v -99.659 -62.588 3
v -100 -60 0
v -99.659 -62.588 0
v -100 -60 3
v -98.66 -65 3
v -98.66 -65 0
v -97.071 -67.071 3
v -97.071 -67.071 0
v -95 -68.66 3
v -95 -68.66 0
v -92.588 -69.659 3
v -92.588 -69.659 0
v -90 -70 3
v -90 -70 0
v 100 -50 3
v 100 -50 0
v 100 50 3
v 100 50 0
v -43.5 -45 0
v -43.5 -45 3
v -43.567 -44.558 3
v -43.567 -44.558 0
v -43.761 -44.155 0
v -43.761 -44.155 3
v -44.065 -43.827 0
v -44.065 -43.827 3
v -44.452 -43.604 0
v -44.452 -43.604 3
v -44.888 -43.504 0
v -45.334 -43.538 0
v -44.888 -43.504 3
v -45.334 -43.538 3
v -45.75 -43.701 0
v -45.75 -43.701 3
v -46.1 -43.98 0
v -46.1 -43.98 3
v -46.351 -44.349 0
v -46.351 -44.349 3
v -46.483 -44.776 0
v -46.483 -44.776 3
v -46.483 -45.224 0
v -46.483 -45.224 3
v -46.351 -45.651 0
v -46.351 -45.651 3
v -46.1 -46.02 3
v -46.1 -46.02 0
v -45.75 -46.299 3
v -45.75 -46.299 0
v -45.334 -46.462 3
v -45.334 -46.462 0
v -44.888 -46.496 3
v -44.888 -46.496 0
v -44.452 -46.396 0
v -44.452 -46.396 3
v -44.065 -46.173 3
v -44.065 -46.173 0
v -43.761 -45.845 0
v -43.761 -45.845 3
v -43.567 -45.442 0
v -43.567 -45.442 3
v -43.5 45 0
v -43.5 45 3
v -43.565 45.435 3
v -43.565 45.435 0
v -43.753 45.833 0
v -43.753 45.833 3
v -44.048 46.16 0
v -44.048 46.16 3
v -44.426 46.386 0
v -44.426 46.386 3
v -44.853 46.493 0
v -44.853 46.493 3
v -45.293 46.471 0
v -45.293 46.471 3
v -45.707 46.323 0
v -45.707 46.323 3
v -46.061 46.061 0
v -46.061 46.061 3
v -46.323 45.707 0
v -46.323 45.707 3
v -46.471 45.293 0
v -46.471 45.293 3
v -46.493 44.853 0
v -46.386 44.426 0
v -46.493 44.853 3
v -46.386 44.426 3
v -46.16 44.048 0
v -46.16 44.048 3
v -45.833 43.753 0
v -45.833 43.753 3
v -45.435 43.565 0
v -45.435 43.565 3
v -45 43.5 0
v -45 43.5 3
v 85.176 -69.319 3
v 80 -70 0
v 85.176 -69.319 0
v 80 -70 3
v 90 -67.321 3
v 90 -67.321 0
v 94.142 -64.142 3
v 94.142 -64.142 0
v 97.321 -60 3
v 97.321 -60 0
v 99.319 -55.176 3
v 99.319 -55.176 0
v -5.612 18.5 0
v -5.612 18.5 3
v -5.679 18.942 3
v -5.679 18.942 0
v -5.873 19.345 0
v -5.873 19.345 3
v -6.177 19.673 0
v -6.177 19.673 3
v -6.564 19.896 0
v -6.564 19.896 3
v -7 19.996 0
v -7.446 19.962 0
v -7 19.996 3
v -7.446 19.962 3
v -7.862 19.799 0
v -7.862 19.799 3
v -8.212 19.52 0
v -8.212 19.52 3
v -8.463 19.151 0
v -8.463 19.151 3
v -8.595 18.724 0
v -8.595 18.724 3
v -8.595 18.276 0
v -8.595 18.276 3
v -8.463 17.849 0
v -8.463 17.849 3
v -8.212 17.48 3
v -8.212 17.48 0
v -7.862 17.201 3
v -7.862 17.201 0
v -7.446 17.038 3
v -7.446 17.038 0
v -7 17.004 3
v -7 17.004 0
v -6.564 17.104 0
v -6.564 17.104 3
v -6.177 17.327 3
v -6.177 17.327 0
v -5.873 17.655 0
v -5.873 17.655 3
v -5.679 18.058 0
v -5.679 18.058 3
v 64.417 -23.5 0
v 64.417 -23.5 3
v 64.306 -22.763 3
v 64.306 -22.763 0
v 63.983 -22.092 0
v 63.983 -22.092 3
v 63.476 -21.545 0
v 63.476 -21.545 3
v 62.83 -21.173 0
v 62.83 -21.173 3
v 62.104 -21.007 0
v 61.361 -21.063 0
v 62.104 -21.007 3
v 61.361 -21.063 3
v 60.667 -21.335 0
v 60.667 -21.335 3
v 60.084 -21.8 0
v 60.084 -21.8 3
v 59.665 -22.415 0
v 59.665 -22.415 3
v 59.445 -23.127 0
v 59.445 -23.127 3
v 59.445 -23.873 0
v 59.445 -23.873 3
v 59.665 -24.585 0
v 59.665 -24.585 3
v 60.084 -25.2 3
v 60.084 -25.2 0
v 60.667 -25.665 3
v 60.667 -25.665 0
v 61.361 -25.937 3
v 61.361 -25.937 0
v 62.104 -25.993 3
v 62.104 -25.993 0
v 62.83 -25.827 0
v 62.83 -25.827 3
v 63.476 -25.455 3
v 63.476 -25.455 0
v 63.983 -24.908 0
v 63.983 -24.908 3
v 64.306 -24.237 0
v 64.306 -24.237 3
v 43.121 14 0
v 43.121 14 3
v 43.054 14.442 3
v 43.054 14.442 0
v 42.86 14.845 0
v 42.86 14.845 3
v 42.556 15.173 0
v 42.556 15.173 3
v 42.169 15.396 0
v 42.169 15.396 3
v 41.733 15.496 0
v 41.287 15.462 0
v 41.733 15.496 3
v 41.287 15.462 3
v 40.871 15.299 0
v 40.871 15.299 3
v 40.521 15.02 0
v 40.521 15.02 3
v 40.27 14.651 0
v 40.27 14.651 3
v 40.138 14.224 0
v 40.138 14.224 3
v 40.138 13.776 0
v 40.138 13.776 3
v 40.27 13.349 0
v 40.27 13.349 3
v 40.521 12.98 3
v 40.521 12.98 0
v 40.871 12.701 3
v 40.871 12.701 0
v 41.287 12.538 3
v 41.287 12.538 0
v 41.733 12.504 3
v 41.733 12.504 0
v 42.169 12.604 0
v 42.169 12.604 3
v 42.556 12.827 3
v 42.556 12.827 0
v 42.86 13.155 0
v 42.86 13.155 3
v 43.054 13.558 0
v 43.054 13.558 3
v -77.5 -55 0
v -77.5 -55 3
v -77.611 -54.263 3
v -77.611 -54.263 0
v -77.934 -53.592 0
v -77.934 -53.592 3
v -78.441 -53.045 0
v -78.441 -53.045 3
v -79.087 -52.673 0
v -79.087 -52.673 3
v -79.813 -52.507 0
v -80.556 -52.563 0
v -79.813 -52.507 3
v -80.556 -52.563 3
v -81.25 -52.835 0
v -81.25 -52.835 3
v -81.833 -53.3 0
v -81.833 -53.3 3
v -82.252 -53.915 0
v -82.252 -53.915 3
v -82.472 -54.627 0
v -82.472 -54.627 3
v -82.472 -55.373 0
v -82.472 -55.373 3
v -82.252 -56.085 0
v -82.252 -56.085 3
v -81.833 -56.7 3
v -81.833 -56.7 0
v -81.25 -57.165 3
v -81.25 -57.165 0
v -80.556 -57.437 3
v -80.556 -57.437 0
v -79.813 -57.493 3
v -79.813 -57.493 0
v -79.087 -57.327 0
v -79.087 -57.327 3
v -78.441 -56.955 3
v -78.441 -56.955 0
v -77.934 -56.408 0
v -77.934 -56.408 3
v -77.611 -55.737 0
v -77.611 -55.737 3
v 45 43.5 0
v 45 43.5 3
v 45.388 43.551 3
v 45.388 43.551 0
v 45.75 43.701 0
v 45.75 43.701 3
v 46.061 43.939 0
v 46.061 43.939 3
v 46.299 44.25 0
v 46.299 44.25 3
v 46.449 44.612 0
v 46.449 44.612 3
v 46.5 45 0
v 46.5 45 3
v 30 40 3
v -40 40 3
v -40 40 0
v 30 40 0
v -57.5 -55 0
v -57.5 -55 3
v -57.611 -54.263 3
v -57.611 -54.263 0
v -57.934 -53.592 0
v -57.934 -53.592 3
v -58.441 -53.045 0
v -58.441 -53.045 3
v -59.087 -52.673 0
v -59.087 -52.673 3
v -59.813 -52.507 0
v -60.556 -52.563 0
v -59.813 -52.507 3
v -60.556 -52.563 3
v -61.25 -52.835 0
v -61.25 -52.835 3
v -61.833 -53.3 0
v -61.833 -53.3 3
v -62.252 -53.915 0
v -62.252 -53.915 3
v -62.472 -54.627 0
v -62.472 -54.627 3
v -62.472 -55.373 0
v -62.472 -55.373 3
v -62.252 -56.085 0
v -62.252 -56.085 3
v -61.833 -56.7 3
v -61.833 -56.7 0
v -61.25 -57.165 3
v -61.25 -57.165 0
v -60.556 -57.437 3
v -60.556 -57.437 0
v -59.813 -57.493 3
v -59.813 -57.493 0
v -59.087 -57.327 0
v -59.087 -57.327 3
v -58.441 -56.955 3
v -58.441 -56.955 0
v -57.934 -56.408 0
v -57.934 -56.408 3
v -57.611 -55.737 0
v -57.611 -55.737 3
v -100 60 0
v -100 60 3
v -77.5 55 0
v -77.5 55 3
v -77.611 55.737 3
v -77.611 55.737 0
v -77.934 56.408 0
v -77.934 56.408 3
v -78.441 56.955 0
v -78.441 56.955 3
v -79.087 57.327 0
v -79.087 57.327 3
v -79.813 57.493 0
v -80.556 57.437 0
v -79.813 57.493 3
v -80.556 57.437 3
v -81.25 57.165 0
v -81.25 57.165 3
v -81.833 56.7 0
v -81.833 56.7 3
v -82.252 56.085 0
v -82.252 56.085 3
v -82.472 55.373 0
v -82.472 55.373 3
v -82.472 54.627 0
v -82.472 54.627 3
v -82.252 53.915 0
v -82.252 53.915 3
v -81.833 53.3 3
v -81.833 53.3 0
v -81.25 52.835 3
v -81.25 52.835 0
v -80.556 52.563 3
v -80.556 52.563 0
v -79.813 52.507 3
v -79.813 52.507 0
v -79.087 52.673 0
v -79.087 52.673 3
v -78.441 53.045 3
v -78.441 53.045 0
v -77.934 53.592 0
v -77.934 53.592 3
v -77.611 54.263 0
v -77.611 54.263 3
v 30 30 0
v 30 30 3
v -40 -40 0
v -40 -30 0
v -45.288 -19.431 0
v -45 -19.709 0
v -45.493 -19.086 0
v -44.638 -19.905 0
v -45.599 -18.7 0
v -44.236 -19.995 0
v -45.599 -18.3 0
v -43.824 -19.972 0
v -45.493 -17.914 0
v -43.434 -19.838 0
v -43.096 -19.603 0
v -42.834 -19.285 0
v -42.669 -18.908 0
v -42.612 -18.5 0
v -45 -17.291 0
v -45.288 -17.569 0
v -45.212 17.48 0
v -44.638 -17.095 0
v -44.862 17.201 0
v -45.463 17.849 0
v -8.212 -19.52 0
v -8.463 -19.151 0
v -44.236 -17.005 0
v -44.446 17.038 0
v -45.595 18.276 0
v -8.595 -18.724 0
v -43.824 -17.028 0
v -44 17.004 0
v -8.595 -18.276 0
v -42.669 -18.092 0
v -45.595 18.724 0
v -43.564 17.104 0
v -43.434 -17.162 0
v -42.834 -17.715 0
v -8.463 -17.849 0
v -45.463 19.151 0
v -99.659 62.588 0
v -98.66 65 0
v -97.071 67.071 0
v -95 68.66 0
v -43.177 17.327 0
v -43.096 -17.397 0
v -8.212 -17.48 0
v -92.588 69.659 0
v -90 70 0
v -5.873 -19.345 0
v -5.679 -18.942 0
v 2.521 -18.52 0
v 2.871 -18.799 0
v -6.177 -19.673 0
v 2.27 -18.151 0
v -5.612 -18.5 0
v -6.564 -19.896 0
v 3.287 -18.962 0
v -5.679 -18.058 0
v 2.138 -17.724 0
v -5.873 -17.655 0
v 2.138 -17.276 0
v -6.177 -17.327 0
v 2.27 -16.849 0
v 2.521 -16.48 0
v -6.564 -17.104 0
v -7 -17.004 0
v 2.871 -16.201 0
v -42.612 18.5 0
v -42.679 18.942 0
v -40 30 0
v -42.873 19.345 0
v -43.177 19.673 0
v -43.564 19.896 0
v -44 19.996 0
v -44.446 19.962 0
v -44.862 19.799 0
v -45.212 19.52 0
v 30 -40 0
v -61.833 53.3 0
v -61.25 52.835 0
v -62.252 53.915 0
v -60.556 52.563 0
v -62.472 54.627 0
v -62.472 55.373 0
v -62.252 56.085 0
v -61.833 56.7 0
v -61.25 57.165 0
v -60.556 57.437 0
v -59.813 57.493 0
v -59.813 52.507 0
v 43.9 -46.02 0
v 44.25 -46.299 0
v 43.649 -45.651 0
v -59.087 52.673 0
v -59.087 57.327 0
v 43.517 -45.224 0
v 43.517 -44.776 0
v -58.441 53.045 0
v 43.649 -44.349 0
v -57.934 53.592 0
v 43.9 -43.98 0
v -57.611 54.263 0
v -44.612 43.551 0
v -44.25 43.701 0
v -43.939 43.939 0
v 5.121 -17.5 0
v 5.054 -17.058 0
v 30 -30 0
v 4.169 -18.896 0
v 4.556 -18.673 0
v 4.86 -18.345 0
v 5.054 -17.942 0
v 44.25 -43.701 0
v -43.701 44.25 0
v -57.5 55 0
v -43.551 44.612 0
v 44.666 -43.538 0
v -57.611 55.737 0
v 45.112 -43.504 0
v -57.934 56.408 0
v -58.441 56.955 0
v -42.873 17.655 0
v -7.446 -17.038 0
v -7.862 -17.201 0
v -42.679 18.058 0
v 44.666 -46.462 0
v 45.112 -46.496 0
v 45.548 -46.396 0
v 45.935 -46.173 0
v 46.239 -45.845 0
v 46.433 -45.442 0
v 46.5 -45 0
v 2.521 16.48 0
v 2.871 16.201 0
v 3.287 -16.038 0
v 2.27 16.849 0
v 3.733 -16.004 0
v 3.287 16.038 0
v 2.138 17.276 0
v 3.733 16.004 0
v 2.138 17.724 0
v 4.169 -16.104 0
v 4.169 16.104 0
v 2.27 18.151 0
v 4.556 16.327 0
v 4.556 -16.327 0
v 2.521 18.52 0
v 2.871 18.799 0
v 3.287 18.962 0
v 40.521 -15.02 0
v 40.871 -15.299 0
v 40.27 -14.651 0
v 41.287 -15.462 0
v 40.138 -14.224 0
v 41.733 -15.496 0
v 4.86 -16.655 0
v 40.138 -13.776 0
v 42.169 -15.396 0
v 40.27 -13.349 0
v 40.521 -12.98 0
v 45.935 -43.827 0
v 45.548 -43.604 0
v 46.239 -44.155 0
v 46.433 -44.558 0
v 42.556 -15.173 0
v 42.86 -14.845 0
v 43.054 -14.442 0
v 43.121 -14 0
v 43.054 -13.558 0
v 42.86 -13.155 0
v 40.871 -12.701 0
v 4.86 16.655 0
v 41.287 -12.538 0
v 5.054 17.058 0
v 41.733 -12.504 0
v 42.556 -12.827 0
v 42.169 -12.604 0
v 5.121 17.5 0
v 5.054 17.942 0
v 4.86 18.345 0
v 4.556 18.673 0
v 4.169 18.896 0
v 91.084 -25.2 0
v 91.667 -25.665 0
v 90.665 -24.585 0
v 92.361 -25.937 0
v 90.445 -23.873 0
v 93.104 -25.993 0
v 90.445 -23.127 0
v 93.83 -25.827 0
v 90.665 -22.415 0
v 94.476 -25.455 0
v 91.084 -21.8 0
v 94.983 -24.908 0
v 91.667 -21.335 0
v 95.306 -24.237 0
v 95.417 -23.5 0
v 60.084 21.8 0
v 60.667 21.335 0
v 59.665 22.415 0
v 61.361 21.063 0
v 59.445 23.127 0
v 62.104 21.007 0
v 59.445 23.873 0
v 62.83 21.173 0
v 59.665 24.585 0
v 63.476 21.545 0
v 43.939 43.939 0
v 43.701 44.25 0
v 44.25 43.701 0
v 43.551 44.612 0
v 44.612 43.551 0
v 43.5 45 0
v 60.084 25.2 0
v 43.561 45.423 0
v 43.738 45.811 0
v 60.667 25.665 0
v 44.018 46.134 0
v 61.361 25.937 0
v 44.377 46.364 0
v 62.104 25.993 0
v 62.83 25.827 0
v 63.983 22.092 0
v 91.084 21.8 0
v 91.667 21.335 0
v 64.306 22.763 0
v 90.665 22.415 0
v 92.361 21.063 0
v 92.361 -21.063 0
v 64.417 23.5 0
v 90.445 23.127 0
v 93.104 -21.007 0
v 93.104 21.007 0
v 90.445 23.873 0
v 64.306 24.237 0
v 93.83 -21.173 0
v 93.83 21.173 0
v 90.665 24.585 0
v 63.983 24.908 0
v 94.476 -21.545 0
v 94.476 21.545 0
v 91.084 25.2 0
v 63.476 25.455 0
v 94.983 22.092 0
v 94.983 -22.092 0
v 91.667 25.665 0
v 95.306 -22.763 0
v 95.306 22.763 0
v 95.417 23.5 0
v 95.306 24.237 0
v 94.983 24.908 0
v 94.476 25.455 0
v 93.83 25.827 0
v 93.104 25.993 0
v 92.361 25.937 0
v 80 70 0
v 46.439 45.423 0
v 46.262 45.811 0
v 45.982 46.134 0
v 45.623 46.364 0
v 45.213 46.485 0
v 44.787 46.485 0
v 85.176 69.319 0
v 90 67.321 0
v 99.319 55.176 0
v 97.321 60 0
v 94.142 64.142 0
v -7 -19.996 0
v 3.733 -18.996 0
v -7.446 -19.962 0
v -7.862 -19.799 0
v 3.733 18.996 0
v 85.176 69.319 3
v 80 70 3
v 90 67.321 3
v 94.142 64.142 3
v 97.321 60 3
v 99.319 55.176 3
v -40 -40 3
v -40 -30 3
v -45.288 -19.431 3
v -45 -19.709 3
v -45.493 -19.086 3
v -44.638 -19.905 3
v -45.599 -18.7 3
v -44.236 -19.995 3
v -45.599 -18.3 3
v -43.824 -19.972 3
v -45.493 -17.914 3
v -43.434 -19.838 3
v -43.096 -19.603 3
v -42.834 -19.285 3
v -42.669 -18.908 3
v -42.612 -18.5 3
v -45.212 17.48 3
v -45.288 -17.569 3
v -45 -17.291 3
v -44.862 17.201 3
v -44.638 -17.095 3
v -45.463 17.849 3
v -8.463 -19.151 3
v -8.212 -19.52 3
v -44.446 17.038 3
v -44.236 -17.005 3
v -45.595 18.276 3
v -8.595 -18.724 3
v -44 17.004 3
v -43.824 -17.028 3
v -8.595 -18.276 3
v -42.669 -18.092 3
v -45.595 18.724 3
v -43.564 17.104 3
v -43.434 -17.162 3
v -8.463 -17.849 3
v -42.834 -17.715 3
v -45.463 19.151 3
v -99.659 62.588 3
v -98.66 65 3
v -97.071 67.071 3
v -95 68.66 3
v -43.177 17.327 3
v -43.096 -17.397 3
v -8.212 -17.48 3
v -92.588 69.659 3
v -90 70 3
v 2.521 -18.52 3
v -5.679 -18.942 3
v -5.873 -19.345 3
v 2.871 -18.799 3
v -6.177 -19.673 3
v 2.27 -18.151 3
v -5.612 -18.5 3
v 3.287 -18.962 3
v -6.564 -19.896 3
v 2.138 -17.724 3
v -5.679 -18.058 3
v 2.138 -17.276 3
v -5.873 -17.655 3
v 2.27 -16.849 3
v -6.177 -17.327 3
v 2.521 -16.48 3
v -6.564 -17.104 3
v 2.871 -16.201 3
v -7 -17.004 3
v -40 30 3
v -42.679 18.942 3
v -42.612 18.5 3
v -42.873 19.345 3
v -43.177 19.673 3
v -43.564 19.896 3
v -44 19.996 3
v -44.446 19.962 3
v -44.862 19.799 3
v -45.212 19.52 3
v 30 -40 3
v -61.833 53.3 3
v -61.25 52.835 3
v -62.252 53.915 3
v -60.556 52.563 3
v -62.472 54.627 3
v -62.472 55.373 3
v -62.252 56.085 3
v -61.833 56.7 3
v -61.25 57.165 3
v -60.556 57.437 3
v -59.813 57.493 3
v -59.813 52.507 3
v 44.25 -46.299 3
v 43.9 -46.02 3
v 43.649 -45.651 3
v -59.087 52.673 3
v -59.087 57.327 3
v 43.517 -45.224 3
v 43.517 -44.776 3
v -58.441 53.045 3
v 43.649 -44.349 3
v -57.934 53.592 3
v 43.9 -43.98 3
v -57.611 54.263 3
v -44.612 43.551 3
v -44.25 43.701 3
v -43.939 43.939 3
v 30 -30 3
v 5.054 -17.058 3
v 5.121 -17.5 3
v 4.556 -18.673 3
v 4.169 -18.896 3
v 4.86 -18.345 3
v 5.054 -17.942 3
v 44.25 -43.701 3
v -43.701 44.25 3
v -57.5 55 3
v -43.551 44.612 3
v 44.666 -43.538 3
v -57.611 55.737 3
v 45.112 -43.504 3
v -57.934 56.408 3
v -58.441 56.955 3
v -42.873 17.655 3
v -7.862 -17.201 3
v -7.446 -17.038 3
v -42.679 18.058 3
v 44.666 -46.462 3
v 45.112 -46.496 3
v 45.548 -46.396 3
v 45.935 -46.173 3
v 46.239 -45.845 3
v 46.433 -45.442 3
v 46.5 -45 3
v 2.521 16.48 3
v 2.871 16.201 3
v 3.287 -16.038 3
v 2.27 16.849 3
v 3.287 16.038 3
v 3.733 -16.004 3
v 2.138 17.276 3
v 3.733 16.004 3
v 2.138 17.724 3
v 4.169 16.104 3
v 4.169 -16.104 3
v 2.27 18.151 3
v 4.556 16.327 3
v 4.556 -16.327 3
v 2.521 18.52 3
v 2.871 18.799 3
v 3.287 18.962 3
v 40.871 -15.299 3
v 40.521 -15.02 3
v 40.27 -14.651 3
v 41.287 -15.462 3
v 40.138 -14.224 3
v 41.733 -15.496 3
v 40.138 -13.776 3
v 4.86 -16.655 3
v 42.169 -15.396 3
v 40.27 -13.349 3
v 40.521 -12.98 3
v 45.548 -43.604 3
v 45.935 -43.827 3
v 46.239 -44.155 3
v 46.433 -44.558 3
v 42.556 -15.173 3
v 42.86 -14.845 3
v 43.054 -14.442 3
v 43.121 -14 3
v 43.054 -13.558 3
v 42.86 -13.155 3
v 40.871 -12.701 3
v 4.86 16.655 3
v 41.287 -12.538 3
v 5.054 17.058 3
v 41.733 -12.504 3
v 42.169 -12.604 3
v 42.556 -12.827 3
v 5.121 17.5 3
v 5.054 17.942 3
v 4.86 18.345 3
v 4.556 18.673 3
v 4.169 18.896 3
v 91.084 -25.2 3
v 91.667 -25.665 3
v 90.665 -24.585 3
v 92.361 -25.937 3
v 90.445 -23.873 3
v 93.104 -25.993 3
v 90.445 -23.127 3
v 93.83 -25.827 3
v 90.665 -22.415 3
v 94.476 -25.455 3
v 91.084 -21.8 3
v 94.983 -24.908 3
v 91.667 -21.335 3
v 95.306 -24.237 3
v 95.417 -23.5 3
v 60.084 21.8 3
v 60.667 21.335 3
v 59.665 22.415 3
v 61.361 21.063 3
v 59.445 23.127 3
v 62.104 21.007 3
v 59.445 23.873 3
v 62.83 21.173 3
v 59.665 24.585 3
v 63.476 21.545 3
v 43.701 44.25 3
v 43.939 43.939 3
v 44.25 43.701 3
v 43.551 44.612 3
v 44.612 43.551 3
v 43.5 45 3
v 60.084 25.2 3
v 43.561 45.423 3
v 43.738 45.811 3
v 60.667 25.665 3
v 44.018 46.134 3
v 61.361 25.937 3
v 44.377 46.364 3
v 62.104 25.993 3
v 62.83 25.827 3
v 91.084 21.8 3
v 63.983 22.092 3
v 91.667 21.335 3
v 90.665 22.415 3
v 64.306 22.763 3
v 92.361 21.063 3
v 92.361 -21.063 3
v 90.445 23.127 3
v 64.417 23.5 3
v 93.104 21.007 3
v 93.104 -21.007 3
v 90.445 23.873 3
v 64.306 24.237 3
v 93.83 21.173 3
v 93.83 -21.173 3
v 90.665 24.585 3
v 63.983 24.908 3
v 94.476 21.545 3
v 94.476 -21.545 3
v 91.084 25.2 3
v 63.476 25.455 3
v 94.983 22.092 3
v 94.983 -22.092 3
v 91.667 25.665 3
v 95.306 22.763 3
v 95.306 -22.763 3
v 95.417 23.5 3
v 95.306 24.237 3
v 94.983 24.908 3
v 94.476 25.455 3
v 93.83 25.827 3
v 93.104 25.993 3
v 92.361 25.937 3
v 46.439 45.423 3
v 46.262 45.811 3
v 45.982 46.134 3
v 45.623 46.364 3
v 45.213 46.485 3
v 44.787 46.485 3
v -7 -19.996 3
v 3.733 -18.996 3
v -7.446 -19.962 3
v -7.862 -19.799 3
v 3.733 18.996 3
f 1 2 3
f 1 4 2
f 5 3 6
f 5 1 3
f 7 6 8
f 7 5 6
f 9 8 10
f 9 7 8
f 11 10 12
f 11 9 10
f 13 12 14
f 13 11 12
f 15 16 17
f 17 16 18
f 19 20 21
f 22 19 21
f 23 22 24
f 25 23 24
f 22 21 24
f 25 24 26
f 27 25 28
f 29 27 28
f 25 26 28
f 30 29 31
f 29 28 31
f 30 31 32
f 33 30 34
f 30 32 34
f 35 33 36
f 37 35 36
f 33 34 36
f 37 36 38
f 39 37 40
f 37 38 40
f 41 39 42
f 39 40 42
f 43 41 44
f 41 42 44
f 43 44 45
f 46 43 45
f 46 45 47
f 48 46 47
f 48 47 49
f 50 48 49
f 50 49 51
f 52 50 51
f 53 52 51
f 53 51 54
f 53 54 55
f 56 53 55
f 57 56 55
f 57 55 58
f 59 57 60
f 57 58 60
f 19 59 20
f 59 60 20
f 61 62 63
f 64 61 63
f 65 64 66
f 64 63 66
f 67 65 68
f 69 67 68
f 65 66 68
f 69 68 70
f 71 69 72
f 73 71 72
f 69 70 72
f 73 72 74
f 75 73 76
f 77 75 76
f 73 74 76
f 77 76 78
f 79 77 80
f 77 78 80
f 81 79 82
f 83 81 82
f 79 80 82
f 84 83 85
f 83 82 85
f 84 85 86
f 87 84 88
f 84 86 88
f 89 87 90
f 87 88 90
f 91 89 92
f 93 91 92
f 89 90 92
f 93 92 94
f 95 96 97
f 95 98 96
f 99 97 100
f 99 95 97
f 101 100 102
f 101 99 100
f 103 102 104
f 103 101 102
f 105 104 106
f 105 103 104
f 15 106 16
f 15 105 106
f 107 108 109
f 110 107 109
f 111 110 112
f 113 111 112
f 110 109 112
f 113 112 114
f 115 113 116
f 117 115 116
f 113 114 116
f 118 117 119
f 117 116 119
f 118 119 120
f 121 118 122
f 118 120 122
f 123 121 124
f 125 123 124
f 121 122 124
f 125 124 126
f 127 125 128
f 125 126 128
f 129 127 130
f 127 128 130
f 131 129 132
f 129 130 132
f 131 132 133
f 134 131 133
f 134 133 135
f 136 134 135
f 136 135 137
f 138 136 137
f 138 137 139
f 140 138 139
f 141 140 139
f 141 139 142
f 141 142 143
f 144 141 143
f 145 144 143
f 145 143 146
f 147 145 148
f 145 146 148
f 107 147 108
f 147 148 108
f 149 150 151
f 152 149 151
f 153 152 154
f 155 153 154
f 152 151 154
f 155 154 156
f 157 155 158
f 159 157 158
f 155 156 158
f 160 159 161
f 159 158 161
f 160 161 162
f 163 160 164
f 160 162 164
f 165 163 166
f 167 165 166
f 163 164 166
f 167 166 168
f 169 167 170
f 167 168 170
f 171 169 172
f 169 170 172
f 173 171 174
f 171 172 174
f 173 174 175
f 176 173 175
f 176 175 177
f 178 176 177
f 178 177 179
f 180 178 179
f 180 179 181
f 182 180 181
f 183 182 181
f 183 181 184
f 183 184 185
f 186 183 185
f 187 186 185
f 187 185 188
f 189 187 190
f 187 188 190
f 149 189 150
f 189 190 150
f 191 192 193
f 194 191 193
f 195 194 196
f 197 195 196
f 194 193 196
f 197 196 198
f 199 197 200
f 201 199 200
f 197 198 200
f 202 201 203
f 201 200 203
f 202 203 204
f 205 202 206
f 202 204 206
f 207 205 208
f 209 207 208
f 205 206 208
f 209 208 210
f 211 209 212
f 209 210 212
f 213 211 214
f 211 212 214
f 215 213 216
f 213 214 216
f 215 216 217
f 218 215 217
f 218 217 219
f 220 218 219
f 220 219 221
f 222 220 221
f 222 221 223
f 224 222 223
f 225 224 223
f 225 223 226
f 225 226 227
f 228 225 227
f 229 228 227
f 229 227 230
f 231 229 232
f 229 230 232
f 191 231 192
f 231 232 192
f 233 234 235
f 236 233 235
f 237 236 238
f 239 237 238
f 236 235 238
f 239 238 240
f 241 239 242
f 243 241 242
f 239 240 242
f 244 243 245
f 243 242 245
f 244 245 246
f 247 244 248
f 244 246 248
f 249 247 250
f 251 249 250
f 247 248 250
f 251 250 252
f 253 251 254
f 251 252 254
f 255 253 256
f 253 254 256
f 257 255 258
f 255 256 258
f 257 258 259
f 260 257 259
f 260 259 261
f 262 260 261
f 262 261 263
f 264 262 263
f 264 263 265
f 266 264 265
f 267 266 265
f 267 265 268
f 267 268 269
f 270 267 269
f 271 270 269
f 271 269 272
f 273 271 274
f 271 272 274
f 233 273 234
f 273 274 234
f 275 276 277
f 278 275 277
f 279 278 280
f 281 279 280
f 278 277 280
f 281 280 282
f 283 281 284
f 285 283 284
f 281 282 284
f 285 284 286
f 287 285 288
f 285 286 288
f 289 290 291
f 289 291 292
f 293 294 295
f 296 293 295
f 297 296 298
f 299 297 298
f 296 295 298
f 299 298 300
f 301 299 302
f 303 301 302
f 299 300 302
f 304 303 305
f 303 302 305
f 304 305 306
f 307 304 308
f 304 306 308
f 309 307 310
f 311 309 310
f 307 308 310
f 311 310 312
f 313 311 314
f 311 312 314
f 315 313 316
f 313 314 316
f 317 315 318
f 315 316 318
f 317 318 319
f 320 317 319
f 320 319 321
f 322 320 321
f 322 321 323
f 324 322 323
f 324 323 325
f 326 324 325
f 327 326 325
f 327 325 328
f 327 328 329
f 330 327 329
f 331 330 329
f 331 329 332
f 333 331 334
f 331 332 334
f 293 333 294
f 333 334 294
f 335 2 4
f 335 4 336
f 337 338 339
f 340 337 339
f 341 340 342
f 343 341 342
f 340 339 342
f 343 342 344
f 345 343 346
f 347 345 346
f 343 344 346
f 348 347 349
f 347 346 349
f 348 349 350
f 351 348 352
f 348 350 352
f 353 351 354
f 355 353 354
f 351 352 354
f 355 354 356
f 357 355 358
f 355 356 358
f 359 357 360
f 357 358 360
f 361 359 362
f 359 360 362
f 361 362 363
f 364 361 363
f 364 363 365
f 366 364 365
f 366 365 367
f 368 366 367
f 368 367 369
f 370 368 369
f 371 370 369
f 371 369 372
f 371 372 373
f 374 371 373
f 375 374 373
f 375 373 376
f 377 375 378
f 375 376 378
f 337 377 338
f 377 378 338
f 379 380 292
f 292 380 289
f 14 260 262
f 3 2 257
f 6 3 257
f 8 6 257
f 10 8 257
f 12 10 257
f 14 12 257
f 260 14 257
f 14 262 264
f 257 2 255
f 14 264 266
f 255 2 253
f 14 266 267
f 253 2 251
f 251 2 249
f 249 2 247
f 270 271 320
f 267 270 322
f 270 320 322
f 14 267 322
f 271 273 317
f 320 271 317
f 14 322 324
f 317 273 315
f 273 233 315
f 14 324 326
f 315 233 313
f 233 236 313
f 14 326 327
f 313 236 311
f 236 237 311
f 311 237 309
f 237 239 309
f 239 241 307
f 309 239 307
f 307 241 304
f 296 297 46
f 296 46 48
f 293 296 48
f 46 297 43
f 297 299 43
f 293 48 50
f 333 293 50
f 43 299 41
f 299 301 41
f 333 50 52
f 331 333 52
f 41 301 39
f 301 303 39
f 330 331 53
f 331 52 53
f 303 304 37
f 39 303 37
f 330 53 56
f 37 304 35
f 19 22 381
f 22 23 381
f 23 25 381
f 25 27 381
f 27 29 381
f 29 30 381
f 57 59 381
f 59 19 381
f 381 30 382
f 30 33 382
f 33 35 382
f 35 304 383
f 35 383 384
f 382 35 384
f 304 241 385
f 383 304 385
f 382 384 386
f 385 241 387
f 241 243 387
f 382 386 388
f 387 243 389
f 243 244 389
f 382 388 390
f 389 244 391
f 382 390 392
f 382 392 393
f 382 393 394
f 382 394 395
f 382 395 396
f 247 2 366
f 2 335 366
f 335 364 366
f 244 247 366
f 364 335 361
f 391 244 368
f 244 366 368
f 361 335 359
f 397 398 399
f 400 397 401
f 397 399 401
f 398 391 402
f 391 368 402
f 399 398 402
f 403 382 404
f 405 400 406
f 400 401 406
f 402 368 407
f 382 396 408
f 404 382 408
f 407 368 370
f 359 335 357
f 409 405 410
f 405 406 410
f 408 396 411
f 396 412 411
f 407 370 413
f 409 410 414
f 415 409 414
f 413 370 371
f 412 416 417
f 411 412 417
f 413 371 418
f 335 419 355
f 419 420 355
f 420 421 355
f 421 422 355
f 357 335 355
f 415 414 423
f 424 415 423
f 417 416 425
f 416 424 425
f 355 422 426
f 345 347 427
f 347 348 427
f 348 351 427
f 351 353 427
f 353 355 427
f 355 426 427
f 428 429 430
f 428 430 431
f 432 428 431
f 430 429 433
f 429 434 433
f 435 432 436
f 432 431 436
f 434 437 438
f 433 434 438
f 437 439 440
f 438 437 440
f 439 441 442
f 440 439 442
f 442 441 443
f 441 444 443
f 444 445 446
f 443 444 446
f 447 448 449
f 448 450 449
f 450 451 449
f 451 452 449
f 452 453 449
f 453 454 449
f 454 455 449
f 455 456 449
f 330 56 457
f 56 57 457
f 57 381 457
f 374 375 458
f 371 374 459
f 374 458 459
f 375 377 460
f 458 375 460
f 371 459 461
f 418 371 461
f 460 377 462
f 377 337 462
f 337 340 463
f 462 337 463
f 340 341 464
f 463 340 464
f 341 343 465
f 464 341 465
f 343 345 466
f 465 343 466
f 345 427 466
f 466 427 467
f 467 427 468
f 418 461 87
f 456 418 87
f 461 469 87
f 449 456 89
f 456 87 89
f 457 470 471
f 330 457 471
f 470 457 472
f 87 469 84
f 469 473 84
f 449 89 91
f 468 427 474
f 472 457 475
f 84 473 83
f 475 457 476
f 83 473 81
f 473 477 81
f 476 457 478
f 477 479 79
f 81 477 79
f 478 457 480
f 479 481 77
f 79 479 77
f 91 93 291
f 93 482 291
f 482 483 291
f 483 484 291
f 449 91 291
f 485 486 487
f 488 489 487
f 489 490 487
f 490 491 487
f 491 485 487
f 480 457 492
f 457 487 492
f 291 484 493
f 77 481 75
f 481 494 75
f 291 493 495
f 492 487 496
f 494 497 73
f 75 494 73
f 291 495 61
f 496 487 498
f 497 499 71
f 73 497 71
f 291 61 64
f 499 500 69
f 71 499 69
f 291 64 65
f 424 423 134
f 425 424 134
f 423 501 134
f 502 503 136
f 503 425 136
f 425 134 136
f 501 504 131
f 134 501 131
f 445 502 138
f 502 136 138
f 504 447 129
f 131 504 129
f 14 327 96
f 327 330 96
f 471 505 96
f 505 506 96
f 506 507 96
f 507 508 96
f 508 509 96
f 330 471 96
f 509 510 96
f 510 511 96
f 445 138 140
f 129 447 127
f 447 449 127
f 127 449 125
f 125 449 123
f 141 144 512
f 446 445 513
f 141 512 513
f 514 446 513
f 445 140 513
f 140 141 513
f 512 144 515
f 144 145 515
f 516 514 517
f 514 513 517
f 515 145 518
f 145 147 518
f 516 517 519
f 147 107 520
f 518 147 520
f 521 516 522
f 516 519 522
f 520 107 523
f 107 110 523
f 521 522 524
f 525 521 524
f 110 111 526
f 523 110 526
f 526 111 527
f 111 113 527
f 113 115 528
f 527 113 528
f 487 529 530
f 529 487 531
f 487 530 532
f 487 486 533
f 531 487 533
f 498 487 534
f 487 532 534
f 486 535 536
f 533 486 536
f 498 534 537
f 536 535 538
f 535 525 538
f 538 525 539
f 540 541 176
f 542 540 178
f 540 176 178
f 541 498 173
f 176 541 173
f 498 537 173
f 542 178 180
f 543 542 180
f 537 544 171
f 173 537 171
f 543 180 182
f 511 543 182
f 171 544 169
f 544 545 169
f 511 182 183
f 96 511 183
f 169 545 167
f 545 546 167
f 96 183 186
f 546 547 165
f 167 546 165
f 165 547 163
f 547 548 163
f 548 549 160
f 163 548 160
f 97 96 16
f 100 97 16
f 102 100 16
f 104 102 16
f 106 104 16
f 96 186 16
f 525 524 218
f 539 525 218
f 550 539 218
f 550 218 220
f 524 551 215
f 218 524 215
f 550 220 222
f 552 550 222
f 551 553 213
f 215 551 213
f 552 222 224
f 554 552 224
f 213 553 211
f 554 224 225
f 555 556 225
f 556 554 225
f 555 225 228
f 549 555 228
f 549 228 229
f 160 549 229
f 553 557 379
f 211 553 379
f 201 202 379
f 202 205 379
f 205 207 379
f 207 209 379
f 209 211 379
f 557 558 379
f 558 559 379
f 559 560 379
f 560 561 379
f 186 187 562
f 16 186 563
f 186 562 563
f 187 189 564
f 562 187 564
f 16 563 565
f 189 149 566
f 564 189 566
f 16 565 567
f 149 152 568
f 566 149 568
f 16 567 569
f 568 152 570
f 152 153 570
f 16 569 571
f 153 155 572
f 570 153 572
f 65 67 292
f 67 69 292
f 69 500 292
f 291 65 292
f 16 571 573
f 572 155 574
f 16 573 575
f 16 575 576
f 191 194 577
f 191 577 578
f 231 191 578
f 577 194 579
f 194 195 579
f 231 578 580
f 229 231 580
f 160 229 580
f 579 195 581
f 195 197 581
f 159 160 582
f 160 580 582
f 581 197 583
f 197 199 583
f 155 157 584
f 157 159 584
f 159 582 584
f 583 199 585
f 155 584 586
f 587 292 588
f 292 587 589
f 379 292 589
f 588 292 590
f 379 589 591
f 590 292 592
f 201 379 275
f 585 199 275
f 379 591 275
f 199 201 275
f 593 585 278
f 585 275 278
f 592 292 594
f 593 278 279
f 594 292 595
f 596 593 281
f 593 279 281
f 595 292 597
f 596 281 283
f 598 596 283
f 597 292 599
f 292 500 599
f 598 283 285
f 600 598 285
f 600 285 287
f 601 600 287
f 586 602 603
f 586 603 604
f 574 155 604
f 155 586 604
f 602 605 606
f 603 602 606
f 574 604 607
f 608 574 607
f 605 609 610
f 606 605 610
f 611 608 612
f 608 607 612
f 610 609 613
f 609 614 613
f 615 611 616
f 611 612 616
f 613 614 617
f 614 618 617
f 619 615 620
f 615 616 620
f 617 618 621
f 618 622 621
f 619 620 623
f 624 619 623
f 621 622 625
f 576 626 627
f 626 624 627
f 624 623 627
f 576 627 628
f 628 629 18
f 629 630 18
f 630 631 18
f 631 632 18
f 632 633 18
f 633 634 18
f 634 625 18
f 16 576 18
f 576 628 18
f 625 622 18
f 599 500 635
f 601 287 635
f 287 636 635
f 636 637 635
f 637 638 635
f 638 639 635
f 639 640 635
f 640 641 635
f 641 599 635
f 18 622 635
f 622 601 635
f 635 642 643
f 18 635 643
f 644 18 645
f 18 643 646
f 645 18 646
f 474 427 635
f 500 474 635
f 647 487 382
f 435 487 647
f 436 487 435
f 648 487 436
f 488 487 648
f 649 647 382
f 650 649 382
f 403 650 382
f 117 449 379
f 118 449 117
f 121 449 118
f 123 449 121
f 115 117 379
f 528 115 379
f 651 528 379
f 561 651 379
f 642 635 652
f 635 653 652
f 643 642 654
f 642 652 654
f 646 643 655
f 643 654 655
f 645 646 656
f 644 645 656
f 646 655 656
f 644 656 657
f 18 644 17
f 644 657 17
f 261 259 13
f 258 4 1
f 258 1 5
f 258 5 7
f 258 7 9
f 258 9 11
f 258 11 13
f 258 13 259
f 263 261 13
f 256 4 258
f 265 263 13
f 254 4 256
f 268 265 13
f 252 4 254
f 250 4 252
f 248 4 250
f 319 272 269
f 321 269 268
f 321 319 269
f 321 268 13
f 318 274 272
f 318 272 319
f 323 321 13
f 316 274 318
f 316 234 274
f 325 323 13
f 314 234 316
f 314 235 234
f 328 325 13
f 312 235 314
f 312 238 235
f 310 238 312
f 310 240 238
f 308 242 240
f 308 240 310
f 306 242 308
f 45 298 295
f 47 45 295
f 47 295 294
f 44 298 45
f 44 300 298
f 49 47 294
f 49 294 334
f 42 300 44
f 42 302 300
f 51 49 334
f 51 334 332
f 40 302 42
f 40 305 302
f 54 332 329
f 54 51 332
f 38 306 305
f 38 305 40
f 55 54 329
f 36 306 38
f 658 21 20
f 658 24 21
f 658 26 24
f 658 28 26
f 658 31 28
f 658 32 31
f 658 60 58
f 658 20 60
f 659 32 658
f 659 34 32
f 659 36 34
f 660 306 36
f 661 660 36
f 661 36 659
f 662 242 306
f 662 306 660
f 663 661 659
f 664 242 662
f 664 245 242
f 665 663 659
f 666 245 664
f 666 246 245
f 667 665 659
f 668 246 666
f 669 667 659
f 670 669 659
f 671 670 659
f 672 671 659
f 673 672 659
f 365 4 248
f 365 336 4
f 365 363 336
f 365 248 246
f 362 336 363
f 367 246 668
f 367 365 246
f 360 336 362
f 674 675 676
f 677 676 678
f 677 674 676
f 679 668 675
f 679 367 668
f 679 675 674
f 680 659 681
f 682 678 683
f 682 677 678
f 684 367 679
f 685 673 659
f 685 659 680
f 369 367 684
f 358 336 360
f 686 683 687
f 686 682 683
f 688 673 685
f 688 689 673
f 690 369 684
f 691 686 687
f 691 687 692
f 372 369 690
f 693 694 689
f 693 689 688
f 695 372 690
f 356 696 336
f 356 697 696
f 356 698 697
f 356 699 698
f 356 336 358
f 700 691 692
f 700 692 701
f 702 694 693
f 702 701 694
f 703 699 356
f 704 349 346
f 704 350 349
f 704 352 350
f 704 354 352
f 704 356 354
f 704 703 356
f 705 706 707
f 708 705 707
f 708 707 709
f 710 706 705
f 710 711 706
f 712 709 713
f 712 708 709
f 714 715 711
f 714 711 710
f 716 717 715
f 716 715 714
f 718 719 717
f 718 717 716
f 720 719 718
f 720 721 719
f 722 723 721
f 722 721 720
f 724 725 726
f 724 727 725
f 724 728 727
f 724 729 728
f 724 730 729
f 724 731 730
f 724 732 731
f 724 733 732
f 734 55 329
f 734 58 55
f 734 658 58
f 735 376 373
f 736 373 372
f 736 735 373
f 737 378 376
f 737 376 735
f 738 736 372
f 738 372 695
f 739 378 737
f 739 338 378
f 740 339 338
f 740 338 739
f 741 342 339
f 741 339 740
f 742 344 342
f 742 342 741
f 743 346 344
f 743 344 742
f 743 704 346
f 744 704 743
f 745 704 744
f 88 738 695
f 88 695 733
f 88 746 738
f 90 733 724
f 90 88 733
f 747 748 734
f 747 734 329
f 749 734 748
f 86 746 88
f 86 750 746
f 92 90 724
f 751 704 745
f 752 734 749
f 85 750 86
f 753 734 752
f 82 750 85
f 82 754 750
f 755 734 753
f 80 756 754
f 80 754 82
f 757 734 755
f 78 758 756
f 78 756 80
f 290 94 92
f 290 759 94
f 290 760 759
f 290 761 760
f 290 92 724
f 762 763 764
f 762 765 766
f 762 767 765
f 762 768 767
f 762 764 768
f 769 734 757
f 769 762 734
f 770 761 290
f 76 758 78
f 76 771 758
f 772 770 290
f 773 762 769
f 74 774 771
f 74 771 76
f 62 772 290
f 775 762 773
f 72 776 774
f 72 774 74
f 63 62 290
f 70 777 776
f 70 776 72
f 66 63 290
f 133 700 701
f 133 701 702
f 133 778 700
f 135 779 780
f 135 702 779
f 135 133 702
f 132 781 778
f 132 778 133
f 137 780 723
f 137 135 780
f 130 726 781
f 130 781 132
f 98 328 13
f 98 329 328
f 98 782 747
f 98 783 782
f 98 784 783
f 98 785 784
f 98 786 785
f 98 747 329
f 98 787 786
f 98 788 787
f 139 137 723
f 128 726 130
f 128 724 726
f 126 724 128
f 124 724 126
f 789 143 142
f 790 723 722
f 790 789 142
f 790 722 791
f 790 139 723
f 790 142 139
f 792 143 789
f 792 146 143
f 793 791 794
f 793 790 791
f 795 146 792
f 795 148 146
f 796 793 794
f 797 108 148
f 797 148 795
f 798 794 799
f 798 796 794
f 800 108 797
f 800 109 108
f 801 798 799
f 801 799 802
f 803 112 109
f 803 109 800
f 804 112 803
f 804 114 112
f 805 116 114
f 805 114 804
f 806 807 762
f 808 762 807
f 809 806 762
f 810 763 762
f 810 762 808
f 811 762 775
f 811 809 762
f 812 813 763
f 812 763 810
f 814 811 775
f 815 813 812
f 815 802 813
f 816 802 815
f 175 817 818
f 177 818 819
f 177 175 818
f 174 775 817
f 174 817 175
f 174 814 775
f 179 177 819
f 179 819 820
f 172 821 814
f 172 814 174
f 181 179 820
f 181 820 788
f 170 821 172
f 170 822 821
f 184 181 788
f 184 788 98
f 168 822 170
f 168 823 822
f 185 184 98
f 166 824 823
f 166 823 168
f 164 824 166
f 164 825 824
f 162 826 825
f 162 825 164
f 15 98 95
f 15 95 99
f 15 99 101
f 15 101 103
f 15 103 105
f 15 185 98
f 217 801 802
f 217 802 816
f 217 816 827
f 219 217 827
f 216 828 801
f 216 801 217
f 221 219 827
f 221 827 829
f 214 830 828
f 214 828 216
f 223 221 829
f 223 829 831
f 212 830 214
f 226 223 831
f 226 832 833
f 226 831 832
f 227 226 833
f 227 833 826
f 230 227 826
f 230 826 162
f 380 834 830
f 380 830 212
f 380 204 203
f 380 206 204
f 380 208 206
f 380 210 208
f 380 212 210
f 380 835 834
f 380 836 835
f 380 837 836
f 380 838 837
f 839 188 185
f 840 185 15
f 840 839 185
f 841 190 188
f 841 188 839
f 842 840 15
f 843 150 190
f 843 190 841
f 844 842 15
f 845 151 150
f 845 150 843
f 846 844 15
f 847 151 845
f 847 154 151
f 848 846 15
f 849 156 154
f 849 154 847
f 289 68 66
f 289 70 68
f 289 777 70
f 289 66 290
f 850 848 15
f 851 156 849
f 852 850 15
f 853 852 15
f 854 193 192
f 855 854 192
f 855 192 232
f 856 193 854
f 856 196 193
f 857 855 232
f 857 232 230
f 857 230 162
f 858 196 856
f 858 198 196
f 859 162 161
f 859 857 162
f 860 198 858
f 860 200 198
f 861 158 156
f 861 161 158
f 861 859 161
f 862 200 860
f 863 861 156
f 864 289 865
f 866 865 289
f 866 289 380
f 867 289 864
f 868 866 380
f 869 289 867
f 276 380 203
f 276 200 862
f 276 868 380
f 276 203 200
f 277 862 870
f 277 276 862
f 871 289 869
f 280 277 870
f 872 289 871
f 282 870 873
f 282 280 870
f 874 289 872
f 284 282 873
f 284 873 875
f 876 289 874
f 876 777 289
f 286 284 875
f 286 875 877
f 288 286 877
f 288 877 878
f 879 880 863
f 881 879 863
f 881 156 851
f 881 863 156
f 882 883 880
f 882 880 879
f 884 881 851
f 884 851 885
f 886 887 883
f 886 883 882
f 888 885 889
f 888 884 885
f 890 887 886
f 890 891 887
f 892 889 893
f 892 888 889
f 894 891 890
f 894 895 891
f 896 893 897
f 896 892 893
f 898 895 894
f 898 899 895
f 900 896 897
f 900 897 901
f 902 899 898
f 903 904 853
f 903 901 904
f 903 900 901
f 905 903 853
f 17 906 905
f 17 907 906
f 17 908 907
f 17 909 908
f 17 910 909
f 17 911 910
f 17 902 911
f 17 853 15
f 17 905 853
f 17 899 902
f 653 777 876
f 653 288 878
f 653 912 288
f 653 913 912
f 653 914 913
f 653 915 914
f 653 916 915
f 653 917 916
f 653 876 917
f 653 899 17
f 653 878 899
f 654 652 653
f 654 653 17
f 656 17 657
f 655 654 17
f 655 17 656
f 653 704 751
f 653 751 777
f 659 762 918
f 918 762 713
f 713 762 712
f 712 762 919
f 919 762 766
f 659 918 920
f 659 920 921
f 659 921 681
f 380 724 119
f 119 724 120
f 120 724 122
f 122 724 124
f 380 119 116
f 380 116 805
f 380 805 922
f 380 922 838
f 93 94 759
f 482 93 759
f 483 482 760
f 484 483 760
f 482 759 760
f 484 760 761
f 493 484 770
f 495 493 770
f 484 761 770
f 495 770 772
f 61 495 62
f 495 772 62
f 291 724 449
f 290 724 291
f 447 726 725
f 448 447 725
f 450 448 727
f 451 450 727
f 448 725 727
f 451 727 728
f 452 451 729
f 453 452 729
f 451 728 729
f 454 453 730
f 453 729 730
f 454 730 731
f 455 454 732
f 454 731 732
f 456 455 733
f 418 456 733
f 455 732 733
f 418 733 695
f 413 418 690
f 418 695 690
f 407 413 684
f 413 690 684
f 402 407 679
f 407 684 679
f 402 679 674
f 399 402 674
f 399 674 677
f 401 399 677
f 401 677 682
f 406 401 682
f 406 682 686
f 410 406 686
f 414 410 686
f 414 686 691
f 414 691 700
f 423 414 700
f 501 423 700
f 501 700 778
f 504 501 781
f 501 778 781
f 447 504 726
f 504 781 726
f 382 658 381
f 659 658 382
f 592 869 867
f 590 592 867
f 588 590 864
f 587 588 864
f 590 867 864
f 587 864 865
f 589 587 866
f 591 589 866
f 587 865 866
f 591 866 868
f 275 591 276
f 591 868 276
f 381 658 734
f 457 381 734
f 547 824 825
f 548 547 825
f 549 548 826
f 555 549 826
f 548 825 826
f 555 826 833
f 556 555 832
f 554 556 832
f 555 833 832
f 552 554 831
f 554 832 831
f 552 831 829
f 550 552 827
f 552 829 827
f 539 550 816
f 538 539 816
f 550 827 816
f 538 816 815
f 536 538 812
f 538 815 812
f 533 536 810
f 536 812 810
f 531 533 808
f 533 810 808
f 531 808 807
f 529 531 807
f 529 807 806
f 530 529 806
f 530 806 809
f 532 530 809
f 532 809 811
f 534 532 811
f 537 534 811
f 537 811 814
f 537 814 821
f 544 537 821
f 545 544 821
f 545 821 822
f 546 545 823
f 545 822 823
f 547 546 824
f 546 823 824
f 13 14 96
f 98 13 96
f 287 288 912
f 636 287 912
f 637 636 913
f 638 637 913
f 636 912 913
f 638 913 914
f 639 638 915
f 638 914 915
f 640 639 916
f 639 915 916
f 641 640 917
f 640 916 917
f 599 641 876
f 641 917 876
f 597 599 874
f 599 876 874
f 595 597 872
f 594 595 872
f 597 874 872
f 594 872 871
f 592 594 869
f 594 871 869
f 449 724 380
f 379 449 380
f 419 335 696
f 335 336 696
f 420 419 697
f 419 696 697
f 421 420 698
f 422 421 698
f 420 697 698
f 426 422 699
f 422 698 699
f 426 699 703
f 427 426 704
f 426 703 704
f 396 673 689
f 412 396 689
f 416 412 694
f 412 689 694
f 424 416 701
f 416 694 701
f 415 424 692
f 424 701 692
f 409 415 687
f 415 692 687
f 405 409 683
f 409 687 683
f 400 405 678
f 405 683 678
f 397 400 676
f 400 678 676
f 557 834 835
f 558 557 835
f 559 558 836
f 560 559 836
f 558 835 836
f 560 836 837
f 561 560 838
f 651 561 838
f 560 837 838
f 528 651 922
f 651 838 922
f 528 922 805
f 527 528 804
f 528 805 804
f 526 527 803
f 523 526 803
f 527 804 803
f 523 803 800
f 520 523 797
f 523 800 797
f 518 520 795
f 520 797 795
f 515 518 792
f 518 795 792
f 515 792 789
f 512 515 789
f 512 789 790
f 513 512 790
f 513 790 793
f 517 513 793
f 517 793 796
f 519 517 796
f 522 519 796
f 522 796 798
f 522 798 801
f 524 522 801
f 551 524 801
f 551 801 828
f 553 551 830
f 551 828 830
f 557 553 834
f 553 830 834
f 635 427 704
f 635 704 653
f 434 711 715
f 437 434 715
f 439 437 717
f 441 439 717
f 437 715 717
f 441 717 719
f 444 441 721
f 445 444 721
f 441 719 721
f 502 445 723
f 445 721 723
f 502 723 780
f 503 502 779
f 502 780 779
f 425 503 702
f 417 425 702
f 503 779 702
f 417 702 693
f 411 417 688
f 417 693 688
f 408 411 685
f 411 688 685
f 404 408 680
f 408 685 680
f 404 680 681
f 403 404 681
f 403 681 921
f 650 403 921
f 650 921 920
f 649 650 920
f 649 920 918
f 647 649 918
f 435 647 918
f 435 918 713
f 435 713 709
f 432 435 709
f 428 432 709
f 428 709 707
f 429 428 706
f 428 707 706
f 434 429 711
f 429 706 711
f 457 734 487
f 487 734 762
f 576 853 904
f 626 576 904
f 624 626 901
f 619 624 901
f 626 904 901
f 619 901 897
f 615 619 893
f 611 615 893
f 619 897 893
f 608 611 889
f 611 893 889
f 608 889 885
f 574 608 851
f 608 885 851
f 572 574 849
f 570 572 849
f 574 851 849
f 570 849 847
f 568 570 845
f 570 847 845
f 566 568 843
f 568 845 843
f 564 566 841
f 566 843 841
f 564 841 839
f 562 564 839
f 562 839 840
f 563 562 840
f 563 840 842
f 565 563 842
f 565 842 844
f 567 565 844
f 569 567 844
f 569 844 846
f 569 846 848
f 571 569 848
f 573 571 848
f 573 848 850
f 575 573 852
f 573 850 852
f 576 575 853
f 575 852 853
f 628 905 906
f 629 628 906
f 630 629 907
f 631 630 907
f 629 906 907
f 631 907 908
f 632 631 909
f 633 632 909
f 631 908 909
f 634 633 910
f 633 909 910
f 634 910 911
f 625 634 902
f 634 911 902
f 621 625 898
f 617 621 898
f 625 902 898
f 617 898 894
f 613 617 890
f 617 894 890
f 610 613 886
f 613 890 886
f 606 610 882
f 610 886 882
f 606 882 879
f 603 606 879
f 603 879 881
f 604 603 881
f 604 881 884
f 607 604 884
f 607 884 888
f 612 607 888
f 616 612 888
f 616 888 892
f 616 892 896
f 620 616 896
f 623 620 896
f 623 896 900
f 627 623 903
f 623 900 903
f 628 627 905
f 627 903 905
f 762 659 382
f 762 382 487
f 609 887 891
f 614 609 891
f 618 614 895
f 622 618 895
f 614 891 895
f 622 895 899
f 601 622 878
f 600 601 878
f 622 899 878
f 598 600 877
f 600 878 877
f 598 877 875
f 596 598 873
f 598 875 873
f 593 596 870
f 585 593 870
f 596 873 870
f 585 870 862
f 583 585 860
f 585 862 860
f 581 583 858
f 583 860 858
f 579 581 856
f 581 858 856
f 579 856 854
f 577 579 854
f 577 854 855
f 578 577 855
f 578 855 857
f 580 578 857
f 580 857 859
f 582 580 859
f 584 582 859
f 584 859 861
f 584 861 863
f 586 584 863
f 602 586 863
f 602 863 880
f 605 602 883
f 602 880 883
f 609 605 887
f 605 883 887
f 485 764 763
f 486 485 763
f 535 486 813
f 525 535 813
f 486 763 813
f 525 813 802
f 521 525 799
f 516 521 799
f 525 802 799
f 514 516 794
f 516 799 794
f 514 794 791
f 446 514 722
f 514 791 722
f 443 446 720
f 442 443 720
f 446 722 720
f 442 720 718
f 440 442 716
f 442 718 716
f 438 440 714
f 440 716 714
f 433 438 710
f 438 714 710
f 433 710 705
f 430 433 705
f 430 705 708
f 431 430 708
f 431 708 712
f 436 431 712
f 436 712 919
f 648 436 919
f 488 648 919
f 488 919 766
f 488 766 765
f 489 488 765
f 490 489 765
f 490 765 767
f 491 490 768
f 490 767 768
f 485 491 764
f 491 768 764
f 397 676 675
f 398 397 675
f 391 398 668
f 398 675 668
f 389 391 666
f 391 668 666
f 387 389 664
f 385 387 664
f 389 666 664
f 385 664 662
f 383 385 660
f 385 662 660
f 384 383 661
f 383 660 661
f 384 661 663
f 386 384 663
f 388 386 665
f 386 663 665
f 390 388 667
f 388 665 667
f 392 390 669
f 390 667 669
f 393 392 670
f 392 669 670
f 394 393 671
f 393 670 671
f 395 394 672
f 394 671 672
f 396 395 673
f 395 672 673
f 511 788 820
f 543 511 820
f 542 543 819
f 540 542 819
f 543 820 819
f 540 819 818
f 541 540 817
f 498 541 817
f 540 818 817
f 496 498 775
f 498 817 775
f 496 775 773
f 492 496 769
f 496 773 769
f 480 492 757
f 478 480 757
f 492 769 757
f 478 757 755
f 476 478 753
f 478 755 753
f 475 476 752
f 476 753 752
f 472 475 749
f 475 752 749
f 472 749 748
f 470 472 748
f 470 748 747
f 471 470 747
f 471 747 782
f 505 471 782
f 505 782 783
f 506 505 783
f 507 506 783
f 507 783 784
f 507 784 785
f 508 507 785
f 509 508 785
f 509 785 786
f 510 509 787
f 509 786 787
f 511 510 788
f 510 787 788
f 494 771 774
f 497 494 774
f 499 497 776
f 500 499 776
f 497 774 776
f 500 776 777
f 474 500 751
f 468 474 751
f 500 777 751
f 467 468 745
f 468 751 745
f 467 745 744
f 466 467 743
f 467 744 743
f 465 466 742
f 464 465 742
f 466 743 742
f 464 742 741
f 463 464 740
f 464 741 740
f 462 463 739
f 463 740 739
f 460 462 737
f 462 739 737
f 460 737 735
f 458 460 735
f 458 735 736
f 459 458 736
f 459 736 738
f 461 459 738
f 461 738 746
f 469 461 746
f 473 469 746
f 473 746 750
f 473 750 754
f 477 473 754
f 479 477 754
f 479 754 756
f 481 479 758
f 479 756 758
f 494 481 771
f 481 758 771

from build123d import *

# Parameters (mm, degrees)
SKETCH1_W           = 200
SKETCH1_H           = 140
BOSS_EXTRUDE1_DEPTH = 3
SKETCH2_R           = 1.5
SKETCH2_R_2         = 2.5
SKETCH2_W           = 70
SKETCH2_H           = 10
CUT_EXTRUDE1_DEPTH  = 3
FILLET1_R           = 10
FILLET2_R           = 20


with BuildPart() as part:
    # Sketch1 → Boss-Extrude1 (new body)
    with BuildSketch(Plane.XY):
        Rectangle(SKETCH1_W, SKETCH1_H)
    extrude(amount=BOSS_EXTRUDE1_DEPTH)

    # Sketch2 → Cut-Extrude1 (cut)
    with BuildSketch(Plane.XY.offset(3)):
        with Locations((3.621068531, -17.5)):
            Circle(SKETCH2_R)
        with Locations((41.621068531, 14)):
            Circle(SKETCH2_R)
        with Locations((-44.111928007, 18.5)):
            Circle(SKETCH2_R)
        with Locations((-7.111928007, 18.5)):
            Circle(SKETCH2_R)
        with Locations((-7.111928007, -18.5)):
            Circle(SKETCH2_R)
        with Locations((61.917005655, -23.5)):
            Circle(SKETCH2_R_2)
        with Locations((92.917005655, -23.5)):
            Circle(SKETCH2_R_2)
        with Locations((92.917005655, 23.5)):
            Circle(SKETCH2_R_2)
        with Locations((61.917005655, 23.5)):
            Circle(SKETCH2_R_2)
        with Locations((-60, 55)):
            Circle(SKETCH2_R_2)
        with Locations((-60, -55)):
            Circle(SKETCH2_R_2)
        with Locations((-80, -55)):
            Circle(SKETCH2_R_2)
        with BuildLine():
            ThreePointArc((46.5, 45), (45, 46.5), (43.5, 45))
            Line((43.5, 45), (45, 45))
            Line((45, 45), (45, 43.5))
            ThreePointArc((45, 43.5), (46.060660172, 43.939339828), (46.5, 45))
        make_face()
        with BuildLine():
            Line((45, 45), (43.5, 45))
            ThreePointArc((43.5, 45), (43.939339828, 43.939339828), (45, 43.5))
            Line((45, 43.5), (45, 45))
        make_face()
        with Locations((-5, 35)):
            Rectangle(SKETCH2_W, SKETCH2_H)
        with BuildLine():
            Line((-45, 43.5), (-45, 45))
            Line((-45, 45), (-43.5, 45))
            ThreePointArc((-43.5, 45), (-46.060660172, 46.060660172), (-45, 43.5))
        make_face()
        with BuildLine():
            Line((-43.5, 45), (-45, 45))
            Line((-45, 45), (-45, 43.5))
            ThreePointArc((-45, 43.5), (-43.939339828, 43.939339828), (-43.5, 45))
        make_face()
        with BuildLine():
            ThreePointArc((-42.611928007, -18.5), (-43.43447247, -17.161697346), (-45, -17.291145941))
            Line((-45, -17.291145941), (-45, -19.708854059))
            ThreePointArc((-45, -19.708854059), (-43.43447247, -19.838302654), (-42.611928007, -18.5))
        make_face()
        with BuildLine():
            Line((-45, -19.708854059), (-45, -17.291145941))
            ThreePointArc((-45, -17.291145941), (-45.611928007, -18.5), (-45, -19.708854059))
        make_face()
        with Locations((41.621068531, -14)):
            Circle(SKETCH2_R)
        with Locations((-80, 55)):
            Circle(SKETCH2_R_2)
        with Locations((-5, -35)):
            Rectangle(SKETCH2_W, SKETCH2_H)
        with Locations((45, -45)):
            Circle(SKETCH2_R)
        with Locations((-45, -45)):
            Circle(SKETCH2_R)
        with Locations((3.621068531, 17.5)):
            Circle(SKETCH2_R)
    extrude(amount=-CUT_EXTRUDE1_DEPTH, mode=Mode.SUBTRACT)

    # Fillet1
    fillet1_edges = [part.edges().sort_by_distance(p)[0] for p in [
        (-100, -70, 1.5),
        (-100, 70, 1.5),
    ]]
    fillet(fillet1_edges, radius=FILLET1_R)

    # Fillet2
    fillet2_edges = [part.edges().sort_by_distance(p)[0] for p in [
        (100, -70, 1.5),
        (100, 70, 1.5),
    ]]
    fillet(fillet2_edges, radius=FILLET2_R)


solid = part.part
